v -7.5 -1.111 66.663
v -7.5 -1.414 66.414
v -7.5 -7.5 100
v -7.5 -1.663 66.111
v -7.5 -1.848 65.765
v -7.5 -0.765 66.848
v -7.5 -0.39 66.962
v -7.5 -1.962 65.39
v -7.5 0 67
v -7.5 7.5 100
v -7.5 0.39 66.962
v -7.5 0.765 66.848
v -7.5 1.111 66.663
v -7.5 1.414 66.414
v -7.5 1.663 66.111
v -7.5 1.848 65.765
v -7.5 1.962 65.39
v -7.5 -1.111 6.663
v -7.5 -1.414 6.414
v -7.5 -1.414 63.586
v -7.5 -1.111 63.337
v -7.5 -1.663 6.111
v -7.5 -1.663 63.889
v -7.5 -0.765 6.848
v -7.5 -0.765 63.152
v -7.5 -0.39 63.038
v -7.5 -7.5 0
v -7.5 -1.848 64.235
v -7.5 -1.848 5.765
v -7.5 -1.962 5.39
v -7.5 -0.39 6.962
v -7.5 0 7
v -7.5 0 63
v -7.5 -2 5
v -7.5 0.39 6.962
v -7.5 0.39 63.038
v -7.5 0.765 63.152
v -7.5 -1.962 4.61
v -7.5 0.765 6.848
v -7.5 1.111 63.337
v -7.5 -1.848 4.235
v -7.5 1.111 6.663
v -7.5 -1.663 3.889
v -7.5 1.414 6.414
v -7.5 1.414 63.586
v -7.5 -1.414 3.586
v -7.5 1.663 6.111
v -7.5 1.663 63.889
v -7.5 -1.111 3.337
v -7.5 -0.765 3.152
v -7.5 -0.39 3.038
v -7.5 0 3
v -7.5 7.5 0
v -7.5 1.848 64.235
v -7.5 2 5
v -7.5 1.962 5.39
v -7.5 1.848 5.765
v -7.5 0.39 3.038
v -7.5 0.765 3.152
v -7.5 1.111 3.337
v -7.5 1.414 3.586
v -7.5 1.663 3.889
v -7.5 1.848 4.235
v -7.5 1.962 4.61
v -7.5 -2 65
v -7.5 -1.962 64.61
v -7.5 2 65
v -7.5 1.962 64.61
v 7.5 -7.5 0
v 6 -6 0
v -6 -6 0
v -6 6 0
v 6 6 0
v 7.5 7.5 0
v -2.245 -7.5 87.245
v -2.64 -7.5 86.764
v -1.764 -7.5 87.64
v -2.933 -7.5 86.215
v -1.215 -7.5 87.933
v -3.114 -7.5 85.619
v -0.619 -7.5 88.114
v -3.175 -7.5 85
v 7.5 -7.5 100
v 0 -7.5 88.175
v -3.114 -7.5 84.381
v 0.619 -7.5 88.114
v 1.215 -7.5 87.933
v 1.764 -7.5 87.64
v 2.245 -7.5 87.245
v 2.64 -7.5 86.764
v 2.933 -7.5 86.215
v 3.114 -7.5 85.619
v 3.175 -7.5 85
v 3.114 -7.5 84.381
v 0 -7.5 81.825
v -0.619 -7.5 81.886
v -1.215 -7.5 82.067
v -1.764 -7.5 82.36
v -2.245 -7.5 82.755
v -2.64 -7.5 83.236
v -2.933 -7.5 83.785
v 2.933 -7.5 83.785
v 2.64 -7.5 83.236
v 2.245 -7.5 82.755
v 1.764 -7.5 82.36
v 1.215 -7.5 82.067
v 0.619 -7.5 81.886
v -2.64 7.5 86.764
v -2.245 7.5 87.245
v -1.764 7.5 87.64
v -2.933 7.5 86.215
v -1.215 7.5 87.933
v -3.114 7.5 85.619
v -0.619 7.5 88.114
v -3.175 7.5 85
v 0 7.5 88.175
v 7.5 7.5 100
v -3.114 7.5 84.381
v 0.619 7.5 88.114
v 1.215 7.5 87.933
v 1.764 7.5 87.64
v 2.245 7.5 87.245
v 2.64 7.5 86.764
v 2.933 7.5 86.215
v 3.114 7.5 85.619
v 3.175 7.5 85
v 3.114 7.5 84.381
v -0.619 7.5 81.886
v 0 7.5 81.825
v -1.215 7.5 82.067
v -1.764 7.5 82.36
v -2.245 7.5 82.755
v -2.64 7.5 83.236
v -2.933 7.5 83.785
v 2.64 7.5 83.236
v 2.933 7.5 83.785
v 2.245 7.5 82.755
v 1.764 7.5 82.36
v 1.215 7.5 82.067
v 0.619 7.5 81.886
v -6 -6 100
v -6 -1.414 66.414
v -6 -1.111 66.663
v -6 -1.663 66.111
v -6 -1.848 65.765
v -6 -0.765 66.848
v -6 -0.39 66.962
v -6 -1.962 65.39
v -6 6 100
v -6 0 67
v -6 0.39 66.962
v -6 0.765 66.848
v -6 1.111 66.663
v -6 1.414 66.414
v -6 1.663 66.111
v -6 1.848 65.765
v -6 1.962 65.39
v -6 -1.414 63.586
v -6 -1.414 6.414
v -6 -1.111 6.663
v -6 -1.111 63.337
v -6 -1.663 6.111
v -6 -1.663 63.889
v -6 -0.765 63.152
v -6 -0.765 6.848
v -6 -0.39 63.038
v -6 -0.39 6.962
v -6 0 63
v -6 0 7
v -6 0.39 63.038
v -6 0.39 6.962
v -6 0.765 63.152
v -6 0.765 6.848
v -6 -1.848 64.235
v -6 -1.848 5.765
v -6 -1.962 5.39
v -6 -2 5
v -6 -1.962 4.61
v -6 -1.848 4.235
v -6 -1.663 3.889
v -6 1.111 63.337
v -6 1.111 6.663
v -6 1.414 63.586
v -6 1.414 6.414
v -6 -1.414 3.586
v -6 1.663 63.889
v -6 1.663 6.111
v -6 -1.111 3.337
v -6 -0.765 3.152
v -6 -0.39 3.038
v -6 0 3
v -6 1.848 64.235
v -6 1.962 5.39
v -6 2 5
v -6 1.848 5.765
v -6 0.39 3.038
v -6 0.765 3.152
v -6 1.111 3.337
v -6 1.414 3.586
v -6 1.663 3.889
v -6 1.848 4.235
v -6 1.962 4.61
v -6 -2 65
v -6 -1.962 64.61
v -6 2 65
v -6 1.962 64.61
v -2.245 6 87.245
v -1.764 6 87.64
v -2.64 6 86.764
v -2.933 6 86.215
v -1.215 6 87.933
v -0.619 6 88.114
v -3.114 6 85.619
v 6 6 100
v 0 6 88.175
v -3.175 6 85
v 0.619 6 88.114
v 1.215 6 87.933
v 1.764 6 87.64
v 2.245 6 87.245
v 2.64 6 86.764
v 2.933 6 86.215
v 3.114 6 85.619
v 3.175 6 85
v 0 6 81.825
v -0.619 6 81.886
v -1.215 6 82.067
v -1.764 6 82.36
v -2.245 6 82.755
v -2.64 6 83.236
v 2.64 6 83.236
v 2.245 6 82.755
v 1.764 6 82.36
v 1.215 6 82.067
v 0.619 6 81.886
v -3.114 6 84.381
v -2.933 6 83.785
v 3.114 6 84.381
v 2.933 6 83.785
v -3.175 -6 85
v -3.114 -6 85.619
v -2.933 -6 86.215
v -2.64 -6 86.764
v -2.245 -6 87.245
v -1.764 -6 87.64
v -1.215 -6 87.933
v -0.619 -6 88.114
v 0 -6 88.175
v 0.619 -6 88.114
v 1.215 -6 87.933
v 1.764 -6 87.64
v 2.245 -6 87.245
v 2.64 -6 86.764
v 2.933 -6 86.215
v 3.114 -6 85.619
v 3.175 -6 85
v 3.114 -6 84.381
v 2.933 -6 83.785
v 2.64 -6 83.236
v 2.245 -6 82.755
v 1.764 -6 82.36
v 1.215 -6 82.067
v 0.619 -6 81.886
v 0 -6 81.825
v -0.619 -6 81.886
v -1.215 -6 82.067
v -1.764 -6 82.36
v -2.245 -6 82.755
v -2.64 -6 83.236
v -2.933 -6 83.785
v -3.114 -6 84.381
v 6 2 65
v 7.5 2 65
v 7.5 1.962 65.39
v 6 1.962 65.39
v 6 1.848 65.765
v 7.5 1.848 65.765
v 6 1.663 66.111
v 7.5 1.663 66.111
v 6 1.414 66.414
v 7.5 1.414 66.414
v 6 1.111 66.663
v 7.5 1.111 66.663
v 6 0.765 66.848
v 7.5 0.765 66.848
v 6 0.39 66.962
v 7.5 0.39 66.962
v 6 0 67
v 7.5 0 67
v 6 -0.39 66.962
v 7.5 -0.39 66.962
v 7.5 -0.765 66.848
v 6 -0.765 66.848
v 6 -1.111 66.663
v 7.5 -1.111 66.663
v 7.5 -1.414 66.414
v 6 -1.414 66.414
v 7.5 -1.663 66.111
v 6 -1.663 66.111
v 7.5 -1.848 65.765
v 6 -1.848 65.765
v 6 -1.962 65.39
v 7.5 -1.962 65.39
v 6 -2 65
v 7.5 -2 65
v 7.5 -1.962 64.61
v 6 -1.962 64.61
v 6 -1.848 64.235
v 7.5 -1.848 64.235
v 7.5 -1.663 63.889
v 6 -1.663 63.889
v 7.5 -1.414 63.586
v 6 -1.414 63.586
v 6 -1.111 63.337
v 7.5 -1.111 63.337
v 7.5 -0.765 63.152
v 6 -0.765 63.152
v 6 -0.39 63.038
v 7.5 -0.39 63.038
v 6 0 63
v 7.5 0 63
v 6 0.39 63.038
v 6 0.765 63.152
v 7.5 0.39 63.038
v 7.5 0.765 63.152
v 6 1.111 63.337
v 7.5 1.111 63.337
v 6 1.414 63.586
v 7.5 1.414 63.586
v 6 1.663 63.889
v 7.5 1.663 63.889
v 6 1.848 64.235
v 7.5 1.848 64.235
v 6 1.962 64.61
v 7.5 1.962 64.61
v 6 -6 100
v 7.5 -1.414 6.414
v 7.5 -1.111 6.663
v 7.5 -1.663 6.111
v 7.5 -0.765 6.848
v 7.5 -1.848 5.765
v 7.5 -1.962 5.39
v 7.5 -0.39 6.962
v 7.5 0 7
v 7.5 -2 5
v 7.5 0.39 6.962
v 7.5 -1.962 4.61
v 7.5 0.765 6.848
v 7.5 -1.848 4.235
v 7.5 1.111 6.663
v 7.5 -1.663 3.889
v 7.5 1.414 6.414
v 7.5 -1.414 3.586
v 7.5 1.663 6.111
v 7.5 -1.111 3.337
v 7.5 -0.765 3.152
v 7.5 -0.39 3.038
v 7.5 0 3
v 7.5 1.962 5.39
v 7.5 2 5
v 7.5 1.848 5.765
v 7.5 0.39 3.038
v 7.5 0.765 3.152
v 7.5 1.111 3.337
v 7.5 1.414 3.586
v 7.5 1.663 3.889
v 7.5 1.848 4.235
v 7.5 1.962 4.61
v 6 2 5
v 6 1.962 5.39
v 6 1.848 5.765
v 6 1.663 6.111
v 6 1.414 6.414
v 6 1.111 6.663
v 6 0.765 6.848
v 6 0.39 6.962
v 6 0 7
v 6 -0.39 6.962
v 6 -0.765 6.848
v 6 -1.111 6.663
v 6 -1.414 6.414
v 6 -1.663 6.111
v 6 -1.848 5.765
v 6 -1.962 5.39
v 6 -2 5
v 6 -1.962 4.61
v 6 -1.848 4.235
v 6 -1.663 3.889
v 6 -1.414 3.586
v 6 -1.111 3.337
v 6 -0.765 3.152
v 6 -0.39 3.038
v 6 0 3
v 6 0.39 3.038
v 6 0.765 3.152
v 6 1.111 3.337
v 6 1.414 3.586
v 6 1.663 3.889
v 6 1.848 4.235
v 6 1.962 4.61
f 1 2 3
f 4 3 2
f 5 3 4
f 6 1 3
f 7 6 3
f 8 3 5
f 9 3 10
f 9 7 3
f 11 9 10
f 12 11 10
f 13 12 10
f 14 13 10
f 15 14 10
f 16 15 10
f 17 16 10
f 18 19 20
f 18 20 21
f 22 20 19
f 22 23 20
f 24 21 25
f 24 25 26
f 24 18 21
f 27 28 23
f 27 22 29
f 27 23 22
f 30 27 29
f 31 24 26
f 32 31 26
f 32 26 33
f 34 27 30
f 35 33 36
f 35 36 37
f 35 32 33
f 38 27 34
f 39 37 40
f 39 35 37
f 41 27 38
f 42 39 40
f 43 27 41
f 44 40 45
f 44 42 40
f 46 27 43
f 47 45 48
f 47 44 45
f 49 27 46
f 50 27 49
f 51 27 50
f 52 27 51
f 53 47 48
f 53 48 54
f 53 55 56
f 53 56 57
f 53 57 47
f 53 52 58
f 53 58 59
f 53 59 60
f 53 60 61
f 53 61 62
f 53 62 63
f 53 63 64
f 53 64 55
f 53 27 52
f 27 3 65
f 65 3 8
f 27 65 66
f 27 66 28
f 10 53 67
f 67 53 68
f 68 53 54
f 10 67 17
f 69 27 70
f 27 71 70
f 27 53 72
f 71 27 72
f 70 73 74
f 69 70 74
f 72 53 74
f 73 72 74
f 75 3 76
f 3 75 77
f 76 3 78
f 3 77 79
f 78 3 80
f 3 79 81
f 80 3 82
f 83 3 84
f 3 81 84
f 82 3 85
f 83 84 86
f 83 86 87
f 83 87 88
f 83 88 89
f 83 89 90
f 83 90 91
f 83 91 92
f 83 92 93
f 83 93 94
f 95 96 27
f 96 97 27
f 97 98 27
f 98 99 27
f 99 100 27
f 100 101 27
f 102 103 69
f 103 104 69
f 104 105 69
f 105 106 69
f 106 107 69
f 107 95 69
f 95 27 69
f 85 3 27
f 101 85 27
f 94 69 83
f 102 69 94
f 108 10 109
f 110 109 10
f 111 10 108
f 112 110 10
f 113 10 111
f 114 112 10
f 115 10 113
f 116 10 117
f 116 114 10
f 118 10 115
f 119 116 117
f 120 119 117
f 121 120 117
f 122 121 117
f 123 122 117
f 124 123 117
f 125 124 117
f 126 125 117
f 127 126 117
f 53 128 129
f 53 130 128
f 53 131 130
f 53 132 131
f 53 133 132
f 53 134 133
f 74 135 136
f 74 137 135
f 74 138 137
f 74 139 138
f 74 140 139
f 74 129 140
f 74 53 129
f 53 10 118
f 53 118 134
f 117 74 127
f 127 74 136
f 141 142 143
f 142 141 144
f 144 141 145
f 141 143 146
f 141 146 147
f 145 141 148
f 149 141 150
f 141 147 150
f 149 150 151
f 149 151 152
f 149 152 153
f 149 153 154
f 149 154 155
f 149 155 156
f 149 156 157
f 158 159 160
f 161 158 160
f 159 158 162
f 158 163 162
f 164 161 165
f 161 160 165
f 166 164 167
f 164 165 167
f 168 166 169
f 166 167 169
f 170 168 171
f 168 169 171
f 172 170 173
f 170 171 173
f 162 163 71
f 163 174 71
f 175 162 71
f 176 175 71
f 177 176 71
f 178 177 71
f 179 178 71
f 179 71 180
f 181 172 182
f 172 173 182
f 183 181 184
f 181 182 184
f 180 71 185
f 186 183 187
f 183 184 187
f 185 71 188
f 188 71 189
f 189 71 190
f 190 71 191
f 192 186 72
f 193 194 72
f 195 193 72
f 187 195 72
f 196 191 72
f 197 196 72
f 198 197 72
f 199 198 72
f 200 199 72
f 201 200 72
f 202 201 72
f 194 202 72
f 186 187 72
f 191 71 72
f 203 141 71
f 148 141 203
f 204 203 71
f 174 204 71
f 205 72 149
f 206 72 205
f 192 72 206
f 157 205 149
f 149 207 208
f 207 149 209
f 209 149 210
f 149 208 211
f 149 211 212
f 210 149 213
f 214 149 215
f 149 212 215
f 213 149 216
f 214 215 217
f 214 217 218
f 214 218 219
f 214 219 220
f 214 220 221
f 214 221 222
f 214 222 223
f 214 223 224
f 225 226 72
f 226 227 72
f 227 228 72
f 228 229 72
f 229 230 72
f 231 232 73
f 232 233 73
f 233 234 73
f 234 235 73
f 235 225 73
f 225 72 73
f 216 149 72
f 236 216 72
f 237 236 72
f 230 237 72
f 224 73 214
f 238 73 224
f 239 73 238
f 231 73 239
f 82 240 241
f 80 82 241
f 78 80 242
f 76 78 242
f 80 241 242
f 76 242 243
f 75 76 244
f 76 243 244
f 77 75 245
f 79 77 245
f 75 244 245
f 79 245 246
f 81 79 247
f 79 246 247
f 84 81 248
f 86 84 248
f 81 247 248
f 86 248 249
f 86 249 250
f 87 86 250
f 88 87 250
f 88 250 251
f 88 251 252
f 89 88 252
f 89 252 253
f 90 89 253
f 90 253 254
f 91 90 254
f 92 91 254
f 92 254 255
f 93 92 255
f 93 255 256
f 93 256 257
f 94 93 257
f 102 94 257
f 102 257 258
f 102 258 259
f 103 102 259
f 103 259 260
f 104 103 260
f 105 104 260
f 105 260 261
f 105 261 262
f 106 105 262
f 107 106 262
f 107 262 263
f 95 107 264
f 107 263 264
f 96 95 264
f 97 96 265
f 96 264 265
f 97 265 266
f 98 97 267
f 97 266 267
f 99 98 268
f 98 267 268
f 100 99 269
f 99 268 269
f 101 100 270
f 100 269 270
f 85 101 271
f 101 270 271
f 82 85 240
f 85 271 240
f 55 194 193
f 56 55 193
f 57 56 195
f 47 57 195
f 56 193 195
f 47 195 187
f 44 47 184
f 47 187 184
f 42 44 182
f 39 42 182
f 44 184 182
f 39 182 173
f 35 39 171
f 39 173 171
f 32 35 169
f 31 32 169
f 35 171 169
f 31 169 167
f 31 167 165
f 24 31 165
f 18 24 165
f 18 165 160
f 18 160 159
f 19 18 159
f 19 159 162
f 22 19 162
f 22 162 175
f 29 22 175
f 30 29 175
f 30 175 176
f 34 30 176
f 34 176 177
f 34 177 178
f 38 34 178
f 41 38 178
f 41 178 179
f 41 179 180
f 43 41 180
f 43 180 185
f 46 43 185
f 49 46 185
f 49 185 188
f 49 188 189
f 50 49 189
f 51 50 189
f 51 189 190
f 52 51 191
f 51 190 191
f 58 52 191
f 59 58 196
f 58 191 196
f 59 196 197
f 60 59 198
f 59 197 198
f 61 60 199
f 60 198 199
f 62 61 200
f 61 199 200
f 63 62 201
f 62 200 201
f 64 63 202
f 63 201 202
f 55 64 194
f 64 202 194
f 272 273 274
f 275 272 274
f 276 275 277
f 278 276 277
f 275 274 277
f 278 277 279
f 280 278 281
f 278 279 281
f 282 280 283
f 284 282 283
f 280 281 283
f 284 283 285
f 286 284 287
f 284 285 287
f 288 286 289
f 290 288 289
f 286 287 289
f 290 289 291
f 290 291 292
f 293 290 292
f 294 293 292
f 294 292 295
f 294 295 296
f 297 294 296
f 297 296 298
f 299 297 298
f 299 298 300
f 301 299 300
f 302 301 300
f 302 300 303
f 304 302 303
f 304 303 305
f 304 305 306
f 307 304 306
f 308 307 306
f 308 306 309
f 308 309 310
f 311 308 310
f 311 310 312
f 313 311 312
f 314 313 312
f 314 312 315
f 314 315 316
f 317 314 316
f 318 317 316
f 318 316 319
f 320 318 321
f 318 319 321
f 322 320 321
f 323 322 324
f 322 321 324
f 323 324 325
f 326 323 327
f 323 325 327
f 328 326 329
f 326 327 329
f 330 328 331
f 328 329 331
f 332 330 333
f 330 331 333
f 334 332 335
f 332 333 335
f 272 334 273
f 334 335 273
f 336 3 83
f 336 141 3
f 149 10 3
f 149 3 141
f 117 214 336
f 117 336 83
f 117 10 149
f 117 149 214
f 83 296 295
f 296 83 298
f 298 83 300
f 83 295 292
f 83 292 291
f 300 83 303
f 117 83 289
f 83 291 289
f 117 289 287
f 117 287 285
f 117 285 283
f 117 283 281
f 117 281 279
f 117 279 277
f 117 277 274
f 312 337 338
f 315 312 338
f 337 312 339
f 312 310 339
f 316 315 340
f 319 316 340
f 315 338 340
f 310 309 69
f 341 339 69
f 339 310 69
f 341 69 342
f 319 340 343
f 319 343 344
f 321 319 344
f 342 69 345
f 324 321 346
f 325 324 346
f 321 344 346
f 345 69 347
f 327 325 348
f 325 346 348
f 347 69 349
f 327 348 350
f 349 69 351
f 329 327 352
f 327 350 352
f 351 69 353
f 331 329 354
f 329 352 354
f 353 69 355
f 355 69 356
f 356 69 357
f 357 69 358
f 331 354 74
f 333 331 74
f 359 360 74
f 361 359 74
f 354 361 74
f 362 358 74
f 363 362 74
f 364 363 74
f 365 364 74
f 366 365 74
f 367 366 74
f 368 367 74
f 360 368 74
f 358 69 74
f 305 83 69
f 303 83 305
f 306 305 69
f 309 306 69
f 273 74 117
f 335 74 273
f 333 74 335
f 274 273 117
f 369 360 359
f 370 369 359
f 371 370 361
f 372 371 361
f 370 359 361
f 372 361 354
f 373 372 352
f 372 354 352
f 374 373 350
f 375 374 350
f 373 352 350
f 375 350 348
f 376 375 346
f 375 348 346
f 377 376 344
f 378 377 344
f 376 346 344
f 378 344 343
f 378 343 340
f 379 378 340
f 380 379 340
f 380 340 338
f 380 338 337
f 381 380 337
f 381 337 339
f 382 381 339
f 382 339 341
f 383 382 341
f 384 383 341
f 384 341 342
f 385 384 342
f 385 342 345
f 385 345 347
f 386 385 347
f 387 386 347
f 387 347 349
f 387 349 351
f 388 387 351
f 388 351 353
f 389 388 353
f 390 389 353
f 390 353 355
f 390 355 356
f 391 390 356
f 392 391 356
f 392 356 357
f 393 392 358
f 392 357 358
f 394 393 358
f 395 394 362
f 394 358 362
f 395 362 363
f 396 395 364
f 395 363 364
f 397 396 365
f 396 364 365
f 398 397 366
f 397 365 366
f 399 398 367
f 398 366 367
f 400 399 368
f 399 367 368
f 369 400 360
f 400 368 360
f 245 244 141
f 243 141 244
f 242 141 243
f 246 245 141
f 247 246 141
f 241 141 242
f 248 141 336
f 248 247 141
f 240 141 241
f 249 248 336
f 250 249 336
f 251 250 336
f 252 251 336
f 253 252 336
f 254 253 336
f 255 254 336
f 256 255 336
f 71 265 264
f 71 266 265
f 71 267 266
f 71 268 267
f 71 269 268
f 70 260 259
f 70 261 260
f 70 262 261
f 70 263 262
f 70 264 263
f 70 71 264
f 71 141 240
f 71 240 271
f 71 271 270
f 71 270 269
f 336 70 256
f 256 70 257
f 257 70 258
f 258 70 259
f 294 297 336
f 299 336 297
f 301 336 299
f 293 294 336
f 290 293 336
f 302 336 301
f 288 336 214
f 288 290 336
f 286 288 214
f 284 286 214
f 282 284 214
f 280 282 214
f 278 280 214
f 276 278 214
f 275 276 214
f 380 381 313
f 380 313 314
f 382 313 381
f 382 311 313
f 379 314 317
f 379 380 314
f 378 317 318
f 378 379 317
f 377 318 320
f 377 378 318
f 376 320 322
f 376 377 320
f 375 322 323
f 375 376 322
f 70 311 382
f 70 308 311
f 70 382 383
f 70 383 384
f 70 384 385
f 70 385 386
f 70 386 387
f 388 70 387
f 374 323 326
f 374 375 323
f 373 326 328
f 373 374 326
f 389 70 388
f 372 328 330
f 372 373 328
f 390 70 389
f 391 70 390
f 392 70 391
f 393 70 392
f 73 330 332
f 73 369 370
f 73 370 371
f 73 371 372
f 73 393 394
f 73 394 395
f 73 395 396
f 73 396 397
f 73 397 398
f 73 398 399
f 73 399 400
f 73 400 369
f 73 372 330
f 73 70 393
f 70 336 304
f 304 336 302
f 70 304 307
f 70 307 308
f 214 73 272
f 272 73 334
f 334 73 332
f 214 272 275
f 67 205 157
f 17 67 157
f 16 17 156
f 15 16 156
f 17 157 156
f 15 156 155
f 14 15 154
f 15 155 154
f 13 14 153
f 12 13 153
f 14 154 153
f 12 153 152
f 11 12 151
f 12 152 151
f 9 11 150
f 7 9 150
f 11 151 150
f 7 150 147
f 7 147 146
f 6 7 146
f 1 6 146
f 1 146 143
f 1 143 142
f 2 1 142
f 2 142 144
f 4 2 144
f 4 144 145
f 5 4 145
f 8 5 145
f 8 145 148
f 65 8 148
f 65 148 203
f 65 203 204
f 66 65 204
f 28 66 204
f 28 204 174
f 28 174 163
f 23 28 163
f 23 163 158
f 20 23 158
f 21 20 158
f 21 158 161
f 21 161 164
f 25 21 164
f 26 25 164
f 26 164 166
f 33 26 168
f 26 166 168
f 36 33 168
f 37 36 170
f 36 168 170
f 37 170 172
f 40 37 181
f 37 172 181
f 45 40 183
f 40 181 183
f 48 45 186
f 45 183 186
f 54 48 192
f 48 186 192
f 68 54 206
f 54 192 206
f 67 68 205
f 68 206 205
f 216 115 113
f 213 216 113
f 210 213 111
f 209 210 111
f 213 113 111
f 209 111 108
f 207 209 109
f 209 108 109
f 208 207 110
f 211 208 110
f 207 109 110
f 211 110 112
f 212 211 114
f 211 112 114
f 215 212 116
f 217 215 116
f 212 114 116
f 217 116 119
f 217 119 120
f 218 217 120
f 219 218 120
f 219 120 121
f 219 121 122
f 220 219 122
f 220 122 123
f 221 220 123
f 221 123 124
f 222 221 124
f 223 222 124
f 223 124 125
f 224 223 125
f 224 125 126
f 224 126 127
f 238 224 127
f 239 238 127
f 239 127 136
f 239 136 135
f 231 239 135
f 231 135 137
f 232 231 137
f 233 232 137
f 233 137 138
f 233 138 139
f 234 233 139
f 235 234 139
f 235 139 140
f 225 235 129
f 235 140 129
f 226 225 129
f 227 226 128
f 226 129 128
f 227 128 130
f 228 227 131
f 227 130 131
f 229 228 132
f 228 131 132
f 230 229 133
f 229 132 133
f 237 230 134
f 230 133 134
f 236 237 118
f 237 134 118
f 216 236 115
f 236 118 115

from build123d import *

# Parameters (mm, degrees)
SKETCH_1_W          = 15
SKETCH_1_H          = 15
SKETCH_1_W_2        = 12
SKETCH_1_H_2        = 12
EXTRUDE_1_DEPTH     = 100
SKETCH_2_R          = 2
CUT_EXTRUDE_1_DEPTH = 102.396498953
SKETCH_3_R          = 3.175
CUT_EXTRUDE_2_DEPTH = 102.396498953


with BuildPart() as part:
    # ｽｹｯﾁ1 → 押し出し-薄板1 (new body)
    with BuildSketch(Plane.XY):
        Rectangle(SKETCH_1_W, SKETCH_1_H)
        Rectangle(SKETCH_1_W_2, SKETCH_1_H_2, mode=Mode.SUBTRACT)
    extrude(amount=EXTRUDE_1_DEPTH)

    # ｽｹｯﾁ2 → ｶｯﾄ - 押し出し1 (cut, through all)
    with BuildSketch(Plane(origin=(7.5, 0, 0), x_dir=(0, 0, -1), z_dir=(1, 0, 0))):
        with Locations(Location((-5, 0, 0), (0, 0, 90))):
            Circle(SKETCH_2_R)
        with Locations(Location((-65, 0, 0), (0, 0, 90))):
            Circle(SKETCH_2_R)
    extrude(amount=-CUT_EXTRUDE_1_DEPTH, mode=Mode.SUBTRACT)

    # ｽｹｯﾁ3 → ｶｯﾄ - 押し出し2 (cut, through all)
    with BuildSketch(Plane(origin=(0, 7.5, 0), x_dir=(1, 0, 0), z_dir=(0, 1, 0))):
        with Locations(Location((0, -85, 0), (0, 0, 180))):
            Circle(SKETCH_3_R)
    extrude(amount=-CUT_EXTRUDE_2_DEPTH, mode=Mode.SUBTRACT)


solid = part.part
